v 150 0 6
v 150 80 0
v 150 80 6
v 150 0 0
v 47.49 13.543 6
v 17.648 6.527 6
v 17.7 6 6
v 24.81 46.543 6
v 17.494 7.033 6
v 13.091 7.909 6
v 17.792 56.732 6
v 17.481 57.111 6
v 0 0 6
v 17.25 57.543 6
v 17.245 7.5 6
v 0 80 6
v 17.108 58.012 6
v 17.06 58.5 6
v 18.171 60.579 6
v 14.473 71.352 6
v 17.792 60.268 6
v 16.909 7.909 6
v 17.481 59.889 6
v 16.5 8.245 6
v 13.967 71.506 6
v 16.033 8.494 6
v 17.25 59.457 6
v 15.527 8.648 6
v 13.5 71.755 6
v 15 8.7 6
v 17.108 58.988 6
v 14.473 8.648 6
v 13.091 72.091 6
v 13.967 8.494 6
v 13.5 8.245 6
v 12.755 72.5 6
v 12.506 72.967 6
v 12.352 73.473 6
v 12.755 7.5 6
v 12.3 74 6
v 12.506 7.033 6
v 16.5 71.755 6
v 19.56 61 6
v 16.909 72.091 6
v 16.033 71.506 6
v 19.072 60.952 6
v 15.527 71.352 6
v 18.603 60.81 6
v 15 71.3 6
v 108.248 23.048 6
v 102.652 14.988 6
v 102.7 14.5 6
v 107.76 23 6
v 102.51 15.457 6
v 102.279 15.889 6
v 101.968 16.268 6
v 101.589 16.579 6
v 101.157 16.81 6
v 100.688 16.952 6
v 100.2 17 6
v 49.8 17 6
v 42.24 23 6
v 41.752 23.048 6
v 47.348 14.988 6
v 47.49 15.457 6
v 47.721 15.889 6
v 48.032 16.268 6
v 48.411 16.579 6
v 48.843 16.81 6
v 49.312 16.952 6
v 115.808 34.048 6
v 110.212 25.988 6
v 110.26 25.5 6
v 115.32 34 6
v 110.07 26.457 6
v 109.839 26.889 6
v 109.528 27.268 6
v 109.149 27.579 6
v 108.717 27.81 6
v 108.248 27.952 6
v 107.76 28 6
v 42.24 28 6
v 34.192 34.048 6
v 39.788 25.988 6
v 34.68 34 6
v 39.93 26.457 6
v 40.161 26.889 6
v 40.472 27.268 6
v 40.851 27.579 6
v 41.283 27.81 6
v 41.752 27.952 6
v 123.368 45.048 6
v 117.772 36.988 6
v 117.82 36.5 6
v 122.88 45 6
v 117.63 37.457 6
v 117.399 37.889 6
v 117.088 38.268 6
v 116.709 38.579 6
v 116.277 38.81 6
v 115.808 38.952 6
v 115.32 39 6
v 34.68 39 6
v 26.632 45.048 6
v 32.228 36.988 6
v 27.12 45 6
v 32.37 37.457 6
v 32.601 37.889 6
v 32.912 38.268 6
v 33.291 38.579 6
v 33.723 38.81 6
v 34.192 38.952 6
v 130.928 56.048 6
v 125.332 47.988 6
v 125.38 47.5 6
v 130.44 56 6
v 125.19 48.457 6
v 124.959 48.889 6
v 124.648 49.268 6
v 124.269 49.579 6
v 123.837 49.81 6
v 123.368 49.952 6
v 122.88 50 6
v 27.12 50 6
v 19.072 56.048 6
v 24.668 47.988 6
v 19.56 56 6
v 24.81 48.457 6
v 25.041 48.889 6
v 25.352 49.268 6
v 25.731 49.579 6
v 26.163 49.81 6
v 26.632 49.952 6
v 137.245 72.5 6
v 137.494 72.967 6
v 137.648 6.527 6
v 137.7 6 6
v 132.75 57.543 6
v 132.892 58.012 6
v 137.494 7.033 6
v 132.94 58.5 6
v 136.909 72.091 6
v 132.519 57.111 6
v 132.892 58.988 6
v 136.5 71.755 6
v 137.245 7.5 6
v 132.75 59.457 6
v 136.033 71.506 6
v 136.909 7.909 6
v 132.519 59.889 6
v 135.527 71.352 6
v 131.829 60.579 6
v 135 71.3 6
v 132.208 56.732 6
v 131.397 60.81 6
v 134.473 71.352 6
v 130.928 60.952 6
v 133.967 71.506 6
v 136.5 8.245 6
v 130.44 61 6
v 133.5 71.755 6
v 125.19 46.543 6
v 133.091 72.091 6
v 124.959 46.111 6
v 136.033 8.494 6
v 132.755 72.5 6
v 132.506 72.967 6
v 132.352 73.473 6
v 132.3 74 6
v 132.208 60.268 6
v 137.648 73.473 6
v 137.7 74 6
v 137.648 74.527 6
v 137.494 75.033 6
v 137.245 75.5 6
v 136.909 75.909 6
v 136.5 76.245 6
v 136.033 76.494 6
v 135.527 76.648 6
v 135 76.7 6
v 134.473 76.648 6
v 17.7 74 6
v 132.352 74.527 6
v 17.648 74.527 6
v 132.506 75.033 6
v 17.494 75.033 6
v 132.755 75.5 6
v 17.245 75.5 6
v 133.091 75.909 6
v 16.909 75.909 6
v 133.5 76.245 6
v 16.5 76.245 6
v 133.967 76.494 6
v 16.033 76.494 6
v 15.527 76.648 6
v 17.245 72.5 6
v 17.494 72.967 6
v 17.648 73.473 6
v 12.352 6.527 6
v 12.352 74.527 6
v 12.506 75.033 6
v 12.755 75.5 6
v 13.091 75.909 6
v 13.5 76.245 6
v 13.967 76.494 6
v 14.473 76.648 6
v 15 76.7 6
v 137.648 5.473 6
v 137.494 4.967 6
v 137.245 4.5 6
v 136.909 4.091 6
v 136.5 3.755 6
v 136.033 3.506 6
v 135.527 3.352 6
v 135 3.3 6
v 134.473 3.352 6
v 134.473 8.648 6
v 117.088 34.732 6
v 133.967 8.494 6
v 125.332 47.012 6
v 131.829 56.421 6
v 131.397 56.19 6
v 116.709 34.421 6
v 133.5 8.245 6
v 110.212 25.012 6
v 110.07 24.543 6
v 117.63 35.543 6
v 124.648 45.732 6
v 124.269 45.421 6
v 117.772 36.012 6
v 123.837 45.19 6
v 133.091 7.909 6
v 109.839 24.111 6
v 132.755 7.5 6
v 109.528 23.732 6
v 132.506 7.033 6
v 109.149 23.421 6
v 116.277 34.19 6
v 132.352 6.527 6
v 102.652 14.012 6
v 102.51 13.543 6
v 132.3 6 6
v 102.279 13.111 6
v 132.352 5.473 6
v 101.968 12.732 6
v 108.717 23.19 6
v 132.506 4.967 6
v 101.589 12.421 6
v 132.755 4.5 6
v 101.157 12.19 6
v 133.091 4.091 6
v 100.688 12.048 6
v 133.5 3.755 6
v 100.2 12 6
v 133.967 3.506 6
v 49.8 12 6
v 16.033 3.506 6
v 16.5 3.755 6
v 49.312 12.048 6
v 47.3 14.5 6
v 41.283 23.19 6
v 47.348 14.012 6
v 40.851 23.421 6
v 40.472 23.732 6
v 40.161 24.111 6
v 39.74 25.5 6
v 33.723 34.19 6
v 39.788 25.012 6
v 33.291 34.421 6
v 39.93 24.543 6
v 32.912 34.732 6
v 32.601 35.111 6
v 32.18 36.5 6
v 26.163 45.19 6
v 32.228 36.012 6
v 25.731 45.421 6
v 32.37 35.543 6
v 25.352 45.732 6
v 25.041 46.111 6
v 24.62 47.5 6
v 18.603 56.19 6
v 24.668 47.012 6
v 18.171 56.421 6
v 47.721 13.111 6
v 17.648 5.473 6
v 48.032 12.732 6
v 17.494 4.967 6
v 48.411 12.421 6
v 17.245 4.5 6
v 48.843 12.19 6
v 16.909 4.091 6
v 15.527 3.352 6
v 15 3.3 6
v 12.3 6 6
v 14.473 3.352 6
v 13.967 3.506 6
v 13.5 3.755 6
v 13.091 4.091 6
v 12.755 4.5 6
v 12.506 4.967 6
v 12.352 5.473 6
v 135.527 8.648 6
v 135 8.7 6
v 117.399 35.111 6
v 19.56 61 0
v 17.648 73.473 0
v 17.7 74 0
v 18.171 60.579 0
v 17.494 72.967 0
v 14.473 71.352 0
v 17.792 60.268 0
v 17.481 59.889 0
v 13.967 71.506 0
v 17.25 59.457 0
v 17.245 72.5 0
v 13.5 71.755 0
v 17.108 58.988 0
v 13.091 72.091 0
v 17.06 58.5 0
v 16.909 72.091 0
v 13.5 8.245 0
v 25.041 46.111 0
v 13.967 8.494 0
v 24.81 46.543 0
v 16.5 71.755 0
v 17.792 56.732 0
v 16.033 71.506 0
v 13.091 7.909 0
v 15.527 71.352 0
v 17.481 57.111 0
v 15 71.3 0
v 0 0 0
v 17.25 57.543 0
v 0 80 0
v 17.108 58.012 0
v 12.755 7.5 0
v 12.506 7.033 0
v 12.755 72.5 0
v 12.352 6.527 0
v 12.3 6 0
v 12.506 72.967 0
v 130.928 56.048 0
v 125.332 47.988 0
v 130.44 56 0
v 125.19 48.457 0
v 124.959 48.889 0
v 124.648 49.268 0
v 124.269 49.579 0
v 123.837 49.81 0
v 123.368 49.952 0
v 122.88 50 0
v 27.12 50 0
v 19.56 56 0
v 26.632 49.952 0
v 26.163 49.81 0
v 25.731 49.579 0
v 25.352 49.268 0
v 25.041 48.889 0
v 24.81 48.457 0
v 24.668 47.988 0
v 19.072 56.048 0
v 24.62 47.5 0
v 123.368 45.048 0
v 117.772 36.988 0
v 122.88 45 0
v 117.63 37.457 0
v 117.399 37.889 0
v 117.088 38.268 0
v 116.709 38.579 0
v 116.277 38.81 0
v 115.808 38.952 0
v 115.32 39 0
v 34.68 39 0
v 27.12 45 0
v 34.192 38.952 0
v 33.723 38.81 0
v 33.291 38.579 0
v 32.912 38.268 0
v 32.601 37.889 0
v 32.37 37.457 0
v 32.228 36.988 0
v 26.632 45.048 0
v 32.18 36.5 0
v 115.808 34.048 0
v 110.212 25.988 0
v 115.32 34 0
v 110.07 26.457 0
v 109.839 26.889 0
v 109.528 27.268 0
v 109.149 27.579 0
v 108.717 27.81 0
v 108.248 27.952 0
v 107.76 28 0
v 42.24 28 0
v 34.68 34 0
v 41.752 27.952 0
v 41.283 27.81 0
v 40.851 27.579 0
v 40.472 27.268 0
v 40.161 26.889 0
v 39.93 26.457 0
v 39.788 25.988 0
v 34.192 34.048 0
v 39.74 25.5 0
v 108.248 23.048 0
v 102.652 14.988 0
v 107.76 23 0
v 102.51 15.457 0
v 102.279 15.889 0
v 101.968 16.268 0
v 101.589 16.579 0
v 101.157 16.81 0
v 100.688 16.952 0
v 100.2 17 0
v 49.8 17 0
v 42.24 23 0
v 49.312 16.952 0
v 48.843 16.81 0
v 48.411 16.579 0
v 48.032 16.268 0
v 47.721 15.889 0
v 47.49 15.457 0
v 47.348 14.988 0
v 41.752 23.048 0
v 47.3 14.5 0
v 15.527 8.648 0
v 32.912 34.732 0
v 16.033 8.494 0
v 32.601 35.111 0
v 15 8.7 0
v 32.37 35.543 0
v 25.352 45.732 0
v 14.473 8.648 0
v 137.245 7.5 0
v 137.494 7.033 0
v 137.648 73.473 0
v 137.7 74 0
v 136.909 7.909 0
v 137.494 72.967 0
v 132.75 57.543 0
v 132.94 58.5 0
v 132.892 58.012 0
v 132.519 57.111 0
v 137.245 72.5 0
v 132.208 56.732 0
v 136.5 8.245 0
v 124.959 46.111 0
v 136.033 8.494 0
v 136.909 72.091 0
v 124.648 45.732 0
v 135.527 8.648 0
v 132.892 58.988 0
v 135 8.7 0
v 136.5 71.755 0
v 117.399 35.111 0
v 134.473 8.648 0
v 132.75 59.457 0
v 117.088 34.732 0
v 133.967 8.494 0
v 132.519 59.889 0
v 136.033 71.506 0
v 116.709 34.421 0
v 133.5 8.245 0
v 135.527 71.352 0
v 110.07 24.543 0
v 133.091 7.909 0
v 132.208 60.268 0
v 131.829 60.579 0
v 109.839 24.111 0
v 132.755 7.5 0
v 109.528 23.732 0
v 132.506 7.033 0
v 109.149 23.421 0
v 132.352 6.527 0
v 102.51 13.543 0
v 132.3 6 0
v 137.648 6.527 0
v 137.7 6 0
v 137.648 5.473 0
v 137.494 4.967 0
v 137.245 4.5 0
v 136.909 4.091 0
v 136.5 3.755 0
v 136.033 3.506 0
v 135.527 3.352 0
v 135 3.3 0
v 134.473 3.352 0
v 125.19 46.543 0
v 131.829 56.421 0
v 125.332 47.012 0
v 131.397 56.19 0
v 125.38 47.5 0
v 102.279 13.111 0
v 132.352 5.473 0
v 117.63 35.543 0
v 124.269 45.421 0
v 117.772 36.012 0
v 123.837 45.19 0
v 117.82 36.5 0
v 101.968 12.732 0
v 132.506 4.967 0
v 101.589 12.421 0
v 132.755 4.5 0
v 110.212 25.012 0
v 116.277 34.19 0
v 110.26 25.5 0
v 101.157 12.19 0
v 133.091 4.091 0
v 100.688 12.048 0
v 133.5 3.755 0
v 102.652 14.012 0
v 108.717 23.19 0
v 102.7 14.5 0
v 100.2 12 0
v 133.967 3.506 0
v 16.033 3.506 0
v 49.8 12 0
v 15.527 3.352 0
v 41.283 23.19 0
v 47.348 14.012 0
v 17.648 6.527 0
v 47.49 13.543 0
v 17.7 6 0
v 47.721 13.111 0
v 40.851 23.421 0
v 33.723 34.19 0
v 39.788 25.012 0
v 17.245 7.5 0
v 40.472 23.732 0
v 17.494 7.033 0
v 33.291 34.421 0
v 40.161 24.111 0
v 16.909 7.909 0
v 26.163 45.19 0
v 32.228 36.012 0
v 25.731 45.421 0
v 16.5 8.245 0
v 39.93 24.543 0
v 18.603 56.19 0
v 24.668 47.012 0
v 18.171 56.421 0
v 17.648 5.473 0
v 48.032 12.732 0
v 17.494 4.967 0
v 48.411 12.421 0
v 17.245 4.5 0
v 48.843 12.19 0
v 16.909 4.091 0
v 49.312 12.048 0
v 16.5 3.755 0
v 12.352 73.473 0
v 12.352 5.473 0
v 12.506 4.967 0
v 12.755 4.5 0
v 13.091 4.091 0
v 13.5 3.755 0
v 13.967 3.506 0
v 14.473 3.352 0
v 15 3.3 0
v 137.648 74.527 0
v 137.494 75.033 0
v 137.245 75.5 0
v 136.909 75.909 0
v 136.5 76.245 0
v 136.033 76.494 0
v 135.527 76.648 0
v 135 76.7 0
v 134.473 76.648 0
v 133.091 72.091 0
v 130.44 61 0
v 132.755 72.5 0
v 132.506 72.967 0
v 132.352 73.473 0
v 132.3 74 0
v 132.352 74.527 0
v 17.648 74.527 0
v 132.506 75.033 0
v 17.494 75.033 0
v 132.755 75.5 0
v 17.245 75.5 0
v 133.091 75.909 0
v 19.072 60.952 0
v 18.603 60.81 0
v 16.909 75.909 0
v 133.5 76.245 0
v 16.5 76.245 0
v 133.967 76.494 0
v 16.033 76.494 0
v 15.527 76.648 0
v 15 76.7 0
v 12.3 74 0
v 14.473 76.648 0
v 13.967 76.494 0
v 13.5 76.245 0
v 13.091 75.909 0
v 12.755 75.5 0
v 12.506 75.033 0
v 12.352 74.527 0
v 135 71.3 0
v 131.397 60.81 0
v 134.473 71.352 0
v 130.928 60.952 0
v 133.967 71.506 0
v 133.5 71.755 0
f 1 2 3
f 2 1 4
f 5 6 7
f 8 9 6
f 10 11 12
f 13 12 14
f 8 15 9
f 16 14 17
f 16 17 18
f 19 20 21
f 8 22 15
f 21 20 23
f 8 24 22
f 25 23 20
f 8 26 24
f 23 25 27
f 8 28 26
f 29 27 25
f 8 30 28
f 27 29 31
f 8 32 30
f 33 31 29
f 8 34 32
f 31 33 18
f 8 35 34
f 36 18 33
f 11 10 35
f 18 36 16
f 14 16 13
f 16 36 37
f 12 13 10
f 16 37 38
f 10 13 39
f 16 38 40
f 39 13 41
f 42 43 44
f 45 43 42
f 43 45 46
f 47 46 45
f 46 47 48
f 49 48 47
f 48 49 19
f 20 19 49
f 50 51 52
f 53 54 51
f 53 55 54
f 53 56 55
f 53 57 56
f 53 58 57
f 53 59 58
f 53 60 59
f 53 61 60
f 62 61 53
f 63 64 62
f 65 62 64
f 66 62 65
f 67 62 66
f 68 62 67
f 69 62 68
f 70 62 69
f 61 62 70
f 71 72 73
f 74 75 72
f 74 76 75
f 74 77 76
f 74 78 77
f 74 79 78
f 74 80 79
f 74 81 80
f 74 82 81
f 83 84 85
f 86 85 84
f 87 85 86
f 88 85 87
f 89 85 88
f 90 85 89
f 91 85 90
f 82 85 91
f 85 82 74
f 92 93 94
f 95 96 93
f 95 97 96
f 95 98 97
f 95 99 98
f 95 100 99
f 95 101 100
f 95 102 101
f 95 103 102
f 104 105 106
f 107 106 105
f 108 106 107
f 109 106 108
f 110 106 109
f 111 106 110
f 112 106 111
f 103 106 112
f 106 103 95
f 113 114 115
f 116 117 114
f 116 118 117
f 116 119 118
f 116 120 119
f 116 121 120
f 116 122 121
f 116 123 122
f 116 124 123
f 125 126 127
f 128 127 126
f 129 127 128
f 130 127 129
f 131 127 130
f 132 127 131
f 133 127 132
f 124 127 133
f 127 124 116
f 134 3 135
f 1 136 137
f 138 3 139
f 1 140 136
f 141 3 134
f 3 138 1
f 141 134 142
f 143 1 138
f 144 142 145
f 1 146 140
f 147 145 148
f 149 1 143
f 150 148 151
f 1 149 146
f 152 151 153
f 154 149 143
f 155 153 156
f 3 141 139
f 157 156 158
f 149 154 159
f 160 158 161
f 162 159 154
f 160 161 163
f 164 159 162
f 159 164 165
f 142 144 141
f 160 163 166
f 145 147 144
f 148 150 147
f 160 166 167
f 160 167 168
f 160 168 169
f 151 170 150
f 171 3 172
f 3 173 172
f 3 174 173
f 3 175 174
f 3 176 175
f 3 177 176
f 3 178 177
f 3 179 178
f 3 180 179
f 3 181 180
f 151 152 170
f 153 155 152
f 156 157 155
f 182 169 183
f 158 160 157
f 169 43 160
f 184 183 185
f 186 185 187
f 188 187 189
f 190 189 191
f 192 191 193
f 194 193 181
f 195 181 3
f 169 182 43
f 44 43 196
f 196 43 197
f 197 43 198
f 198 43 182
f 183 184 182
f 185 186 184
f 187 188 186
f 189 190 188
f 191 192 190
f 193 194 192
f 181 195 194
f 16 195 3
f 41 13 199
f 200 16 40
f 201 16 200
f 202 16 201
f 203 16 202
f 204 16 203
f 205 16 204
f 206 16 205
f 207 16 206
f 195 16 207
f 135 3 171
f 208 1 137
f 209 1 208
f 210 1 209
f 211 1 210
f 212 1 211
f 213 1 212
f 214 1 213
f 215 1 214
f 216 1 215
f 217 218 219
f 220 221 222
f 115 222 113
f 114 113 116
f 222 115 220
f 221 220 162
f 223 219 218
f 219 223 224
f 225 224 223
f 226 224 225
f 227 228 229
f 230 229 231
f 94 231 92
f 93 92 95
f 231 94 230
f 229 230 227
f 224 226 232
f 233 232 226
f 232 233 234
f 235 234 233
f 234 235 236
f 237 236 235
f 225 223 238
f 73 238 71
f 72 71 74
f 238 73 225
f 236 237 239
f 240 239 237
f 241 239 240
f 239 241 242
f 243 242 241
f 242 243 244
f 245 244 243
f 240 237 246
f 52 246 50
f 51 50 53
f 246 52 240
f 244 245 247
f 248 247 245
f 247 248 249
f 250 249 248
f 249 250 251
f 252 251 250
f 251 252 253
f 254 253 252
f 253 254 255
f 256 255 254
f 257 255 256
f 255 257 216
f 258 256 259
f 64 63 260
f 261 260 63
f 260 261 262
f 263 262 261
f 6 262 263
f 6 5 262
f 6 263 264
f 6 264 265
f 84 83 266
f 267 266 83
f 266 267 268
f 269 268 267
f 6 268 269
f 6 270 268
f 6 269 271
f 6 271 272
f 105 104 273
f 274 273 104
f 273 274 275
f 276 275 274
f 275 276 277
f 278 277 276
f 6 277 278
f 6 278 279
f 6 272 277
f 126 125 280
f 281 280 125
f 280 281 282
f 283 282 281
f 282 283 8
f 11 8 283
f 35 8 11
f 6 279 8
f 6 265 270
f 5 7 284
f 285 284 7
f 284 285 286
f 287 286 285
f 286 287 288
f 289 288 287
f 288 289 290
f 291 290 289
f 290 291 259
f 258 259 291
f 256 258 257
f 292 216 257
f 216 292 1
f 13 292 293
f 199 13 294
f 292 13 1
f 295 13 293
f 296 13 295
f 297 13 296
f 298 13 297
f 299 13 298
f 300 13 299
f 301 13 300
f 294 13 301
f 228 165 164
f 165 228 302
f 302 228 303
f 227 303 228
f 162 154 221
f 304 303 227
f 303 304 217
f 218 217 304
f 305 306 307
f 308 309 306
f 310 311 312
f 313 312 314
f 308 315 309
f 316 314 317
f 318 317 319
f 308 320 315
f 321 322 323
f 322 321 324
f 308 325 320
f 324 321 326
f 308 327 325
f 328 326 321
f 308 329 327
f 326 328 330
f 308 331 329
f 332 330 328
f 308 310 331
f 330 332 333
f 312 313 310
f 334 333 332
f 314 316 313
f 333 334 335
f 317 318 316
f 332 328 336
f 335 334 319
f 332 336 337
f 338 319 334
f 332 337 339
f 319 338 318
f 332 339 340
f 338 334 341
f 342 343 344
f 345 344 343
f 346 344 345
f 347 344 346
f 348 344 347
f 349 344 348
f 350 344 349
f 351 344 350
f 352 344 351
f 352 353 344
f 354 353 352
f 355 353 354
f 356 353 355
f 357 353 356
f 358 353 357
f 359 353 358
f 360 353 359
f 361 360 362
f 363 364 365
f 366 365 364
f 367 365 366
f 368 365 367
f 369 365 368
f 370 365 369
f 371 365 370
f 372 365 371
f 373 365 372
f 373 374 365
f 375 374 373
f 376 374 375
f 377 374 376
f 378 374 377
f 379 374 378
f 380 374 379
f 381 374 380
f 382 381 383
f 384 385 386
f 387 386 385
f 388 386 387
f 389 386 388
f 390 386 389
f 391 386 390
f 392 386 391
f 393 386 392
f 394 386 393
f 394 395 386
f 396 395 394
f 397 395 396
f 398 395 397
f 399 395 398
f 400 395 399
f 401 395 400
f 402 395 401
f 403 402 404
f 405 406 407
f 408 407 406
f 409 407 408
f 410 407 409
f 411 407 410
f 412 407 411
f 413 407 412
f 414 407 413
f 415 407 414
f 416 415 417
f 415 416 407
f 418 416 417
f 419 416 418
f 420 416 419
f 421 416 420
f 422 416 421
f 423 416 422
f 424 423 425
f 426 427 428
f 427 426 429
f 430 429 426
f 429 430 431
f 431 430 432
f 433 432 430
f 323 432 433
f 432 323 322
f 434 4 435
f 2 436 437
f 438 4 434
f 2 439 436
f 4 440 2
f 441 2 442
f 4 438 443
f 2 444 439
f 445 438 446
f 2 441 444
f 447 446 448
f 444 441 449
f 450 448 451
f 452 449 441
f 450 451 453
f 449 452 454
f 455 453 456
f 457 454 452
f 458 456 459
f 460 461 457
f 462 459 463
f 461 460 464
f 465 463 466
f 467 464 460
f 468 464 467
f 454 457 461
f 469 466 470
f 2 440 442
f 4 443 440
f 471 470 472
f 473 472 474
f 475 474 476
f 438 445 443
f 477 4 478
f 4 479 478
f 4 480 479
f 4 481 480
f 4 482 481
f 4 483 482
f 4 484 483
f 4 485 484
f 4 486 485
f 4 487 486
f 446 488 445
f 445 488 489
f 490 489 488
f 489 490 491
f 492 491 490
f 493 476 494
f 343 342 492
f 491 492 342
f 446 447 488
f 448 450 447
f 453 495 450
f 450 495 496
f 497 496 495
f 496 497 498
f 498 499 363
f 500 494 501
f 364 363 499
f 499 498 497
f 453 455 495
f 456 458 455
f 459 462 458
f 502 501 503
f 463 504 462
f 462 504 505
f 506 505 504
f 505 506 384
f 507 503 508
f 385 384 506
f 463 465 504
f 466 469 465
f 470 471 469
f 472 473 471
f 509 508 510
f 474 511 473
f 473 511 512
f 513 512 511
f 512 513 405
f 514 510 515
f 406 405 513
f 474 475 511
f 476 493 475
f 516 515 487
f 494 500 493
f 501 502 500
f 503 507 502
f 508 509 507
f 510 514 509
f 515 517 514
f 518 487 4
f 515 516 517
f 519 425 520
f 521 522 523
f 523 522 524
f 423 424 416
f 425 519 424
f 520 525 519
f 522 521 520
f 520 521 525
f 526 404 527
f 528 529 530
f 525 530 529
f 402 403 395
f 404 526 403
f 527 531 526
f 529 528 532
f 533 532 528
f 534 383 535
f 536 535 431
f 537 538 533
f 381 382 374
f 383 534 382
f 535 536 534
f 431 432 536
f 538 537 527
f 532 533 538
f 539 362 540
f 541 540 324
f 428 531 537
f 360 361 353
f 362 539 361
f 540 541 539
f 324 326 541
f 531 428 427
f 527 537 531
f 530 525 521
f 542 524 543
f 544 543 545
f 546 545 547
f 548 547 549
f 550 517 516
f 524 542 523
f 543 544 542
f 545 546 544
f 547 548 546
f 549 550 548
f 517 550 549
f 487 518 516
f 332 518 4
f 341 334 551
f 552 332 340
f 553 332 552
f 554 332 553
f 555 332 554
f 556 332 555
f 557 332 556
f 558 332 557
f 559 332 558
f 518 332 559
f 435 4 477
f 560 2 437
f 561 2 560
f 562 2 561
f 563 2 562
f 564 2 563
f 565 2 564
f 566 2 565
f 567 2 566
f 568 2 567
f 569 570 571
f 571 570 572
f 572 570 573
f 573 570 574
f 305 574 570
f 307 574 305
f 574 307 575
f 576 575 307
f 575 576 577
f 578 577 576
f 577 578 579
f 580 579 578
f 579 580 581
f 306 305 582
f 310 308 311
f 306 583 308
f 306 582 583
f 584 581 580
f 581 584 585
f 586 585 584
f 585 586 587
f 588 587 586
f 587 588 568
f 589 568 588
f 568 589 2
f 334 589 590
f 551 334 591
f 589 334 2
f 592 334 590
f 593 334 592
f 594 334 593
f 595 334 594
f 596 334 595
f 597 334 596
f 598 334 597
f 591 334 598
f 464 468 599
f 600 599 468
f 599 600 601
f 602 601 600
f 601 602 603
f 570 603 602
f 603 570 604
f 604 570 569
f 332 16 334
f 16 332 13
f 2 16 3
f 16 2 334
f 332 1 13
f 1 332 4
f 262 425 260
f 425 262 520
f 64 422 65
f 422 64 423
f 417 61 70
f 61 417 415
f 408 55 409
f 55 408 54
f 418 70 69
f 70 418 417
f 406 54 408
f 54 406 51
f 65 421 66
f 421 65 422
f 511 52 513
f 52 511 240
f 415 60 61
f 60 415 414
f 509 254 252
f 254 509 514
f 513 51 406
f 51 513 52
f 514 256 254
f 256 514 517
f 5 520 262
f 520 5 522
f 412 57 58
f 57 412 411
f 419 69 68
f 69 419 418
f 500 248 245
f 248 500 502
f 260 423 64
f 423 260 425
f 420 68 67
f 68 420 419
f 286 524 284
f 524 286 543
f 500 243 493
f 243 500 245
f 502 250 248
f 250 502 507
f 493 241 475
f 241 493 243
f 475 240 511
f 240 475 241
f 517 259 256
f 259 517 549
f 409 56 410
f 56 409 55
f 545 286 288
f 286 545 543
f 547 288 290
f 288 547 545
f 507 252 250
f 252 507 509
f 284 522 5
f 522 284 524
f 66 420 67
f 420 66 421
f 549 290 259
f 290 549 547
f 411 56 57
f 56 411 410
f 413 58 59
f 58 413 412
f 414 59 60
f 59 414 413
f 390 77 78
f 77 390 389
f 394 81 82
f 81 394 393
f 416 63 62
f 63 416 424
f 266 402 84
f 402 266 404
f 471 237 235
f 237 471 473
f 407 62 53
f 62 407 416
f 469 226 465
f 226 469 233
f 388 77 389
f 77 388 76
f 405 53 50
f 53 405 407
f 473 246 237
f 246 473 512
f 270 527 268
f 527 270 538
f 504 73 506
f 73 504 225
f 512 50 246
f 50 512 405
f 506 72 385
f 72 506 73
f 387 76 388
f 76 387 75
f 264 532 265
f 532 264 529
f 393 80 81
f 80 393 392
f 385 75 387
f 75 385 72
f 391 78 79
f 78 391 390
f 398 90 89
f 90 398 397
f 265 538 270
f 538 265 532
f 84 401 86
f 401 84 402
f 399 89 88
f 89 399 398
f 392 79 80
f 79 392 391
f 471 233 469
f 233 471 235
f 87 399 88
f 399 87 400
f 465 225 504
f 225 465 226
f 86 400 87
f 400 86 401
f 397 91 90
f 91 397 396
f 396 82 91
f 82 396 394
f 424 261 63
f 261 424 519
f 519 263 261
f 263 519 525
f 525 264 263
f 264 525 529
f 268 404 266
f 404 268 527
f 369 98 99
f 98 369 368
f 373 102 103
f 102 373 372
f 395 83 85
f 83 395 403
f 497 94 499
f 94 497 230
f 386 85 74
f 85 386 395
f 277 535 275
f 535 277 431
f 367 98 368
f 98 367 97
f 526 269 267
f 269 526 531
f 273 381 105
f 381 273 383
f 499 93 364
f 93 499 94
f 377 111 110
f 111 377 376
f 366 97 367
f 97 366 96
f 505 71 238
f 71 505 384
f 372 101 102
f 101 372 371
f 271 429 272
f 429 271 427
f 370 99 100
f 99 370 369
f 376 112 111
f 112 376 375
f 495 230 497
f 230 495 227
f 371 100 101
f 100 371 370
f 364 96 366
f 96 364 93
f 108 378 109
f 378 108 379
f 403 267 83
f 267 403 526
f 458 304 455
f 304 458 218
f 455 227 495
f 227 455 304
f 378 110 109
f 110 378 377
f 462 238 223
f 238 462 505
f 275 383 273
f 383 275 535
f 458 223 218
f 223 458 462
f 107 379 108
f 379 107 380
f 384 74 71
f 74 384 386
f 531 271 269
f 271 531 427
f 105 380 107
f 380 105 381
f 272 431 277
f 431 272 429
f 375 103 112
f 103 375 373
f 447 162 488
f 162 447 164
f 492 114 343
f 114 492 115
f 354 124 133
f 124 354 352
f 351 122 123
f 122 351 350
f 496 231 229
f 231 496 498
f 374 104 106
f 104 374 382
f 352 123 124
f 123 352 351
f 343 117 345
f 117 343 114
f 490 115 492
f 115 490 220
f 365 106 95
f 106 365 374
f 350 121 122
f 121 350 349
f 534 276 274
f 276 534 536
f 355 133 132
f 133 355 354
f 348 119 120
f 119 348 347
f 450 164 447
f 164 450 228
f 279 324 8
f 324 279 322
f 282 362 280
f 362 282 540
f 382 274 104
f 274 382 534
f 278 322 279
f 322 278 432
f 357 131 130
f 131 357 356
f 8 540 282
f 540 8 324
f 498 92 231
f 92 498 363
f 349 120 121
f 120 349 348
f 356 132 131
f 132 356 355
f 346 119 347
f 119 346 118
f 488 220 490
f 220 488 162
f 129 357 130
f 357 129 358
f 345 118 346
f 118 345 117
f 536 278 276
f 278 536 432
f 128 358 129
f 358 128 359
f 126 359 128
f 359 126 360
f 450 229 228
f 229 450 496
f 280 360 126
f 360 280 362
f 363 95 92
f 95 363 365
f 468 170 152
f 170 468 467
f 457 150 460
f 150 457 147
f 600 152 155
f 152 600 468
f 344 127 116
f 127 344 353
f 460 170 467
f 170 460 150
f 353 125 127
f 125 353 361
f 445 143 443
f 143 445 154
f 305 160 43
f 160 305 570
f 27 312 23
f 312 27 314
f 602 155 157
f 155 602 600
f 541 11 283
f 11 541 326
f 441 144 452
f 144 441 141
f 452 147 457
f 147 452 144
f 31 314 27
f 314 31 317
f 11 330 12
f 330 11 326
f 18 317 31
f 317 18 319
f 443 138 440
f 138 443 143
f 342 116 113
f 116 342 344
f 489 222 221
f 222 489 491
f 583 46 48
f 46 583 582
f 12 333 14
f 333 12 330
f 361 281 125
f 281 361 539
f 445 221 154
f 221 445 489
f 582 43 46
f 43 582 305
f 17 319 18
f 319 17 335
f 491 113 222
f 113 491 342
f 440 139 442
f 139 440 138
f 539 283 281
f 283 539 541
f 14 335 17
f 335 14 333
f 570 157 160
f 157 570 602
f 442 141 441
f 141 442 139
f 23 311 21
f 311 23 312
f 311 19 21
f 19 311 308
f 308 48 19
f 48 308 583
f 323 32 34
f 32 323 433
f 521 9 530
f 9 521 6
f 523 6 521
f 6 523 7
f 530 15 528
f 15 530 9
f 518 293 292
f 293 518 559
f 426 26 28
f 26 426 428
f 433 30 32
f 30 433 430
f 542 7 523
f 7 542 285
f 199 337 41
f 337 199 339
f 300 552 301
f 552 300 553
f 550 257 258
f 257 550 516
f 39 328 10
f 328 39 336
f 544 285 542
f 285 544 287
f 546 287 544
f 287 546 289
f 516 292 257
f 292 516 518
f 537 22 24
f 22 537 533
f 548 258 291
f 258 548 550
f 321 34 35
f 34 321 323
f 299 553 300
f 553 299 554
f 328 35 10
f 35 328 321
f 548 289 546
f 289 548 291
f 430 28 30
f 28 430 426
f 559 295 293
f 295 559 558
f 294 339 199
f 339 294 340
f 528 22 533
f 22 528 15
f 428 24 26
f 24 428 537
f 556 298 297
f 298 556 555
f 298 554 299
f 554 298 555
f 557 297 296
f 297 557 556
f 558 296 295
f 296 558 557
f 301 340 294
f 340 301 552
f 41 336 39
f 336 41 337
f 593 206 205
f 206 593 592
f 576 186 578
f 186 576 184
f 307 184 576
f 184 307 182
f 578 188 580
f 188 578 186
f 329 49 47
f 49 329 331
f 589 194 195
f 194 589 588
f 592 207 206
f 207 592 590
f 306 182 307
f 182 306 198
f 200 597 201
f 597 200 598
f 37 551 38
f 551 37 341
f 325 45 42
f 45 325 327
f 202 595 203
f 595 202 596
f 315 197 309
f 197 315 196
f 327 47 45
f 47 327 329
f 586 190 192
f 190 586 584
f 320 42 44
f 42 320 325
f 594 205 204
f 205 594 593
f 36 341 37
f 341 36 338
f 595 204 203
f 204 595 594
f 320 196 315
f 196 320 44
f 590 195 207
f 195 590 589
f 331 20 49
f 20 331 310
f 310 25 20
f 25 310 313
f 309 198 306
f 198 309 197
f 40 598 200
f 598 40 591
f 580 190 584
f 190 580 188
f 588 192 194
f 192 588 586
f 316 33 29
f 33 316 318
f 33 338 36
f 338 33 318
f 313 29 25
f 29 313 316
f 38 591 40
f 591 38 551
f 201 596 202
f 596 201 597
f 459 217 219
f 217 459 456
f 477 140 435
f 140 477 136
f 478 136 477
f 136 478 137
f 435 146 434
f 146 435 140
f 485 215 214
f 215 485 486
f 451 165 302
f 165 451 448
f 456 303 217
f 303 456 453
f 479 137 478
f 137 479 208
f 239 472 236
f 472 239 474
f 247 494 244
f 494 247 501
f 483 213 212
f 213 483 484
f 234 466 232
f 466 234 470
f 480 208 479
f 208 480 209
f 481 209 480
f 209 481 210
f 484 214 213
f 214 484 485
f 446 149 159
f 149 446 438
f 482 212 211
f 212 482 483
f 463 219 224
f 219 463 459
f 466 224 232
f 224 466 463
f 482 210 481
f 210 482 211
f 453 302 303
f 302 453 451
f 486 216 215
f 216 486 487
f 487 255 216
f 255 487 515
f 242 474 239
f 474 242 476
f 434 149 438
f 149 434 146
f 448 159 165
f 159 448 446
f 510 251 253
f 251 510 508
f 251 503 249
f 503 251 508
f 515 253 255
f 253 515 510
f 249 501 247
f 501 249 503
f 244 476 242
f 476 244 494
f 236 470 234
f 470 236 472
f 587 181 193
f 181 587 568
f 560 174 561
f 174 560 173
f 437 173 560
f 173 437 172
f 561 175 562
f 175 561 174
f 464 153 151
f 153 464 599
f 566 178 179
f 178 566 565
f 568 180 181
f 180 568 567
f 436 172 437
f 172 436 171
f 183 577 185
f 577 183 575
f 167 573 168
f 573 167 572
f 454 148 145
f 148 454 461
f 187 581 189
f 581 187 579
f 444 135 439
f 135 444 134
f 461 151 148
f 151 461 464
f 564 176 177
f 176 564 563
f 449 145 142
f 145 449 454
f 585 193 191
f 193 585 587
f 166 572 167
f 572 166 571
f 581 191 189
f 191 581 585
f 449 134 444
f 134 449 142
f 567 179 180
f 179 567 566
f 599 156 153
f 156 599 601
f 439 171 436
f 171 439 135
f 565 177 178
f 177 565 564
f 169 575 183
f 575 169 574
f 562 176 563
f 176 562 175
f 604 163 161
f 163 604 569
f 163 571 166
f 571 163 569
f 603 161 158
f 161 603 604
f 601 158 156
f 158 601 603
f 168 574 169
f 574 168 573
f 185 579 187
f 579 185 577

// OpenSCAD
$fn = 32;

// ----------------------------------------------------------------------
// Slotted panel: 150 x 80 mm, 5 рядов of slots
// ----------------------------------------------------------------------

// --- parameters (mm) ---
panel_w = 150;            // panel width
panel_d = 80;             // panel depth
thick = 6;                // panel thickness
slot_w = 5;               // slot width
pitch0 = 11;              // first row pitch
pitch_step = 2.4;         // pitch increase per row
margin = 12;              // margin around the slot field
rows = 5;                 // number of slot rows
mount_d = 5.4;            // mounting holes
mount_x = 60;             // mounting hole offset

difference() {
  union() {
    cube([panel_w, panel_d, thick]);
  }
  /* slot rows: stadium shaped cutters, 2.5 mm clear of both faces */
  /* row 0: pitch 11, length 50.4 */
  hull() {
    translate([49.8, 14.5, -2.5]) cylinder(h = thick + 5, d = slot_w);
    translate([100.2, 14.5, -2.5]) cylinder(h = thick + 5, d = slot_w);
  }
  /* row 1: pitch 11, length 65.52 */
  hull() {
    translate([42.24, 25.5, -2.5]) cylinder(h = thick + 5, d = slot_w);
    translate([107.76, 25.5, -2.5]) cylinder(h = thick + 5, d = slot_w);
  }
  /* row 2: pitch 11, length 80.64 */
  hull() {
    translate([34.68, 36.5, -2.5]) cylinder(h = thick + 5, d = slot_w);
    translate([115.32, 36.5, -2.5]) cylinder(h = thick + 5, d = slot_w);
  }
  /* row 3: pitch 11, length 95.76 */
  hull() {
    translate([27.12, 47.5, -2.5]) cylinder(h = thick + 5, d = slot_w);
    translate([122.88, 47.5, -2.5]) cylinder(h = thick + 5, d = slot_w);
  }
  /* row 4: pitch 11, length 110.88 */
  hull() {
    translate([19.56, 58.5, -2.5]) cylinder(h = thick + 5, d = slot_w);
    translate([130.44, 58.5, -2.5]) cylinder(h = thick + 5, d = slot_w);
  }
  translate([15, 6, -2.5]) cylinder(h = 11, d = mount_d);
  translate([15, 74, -2.5]) cylinder(h = 11, d = mount_d);
  translate([135, 6, -2.5]) cylinder(h = 11, d = mount_d);
  translate([135, 74, -2.5]) cylinder(h = 11, d = mount_d);
}
